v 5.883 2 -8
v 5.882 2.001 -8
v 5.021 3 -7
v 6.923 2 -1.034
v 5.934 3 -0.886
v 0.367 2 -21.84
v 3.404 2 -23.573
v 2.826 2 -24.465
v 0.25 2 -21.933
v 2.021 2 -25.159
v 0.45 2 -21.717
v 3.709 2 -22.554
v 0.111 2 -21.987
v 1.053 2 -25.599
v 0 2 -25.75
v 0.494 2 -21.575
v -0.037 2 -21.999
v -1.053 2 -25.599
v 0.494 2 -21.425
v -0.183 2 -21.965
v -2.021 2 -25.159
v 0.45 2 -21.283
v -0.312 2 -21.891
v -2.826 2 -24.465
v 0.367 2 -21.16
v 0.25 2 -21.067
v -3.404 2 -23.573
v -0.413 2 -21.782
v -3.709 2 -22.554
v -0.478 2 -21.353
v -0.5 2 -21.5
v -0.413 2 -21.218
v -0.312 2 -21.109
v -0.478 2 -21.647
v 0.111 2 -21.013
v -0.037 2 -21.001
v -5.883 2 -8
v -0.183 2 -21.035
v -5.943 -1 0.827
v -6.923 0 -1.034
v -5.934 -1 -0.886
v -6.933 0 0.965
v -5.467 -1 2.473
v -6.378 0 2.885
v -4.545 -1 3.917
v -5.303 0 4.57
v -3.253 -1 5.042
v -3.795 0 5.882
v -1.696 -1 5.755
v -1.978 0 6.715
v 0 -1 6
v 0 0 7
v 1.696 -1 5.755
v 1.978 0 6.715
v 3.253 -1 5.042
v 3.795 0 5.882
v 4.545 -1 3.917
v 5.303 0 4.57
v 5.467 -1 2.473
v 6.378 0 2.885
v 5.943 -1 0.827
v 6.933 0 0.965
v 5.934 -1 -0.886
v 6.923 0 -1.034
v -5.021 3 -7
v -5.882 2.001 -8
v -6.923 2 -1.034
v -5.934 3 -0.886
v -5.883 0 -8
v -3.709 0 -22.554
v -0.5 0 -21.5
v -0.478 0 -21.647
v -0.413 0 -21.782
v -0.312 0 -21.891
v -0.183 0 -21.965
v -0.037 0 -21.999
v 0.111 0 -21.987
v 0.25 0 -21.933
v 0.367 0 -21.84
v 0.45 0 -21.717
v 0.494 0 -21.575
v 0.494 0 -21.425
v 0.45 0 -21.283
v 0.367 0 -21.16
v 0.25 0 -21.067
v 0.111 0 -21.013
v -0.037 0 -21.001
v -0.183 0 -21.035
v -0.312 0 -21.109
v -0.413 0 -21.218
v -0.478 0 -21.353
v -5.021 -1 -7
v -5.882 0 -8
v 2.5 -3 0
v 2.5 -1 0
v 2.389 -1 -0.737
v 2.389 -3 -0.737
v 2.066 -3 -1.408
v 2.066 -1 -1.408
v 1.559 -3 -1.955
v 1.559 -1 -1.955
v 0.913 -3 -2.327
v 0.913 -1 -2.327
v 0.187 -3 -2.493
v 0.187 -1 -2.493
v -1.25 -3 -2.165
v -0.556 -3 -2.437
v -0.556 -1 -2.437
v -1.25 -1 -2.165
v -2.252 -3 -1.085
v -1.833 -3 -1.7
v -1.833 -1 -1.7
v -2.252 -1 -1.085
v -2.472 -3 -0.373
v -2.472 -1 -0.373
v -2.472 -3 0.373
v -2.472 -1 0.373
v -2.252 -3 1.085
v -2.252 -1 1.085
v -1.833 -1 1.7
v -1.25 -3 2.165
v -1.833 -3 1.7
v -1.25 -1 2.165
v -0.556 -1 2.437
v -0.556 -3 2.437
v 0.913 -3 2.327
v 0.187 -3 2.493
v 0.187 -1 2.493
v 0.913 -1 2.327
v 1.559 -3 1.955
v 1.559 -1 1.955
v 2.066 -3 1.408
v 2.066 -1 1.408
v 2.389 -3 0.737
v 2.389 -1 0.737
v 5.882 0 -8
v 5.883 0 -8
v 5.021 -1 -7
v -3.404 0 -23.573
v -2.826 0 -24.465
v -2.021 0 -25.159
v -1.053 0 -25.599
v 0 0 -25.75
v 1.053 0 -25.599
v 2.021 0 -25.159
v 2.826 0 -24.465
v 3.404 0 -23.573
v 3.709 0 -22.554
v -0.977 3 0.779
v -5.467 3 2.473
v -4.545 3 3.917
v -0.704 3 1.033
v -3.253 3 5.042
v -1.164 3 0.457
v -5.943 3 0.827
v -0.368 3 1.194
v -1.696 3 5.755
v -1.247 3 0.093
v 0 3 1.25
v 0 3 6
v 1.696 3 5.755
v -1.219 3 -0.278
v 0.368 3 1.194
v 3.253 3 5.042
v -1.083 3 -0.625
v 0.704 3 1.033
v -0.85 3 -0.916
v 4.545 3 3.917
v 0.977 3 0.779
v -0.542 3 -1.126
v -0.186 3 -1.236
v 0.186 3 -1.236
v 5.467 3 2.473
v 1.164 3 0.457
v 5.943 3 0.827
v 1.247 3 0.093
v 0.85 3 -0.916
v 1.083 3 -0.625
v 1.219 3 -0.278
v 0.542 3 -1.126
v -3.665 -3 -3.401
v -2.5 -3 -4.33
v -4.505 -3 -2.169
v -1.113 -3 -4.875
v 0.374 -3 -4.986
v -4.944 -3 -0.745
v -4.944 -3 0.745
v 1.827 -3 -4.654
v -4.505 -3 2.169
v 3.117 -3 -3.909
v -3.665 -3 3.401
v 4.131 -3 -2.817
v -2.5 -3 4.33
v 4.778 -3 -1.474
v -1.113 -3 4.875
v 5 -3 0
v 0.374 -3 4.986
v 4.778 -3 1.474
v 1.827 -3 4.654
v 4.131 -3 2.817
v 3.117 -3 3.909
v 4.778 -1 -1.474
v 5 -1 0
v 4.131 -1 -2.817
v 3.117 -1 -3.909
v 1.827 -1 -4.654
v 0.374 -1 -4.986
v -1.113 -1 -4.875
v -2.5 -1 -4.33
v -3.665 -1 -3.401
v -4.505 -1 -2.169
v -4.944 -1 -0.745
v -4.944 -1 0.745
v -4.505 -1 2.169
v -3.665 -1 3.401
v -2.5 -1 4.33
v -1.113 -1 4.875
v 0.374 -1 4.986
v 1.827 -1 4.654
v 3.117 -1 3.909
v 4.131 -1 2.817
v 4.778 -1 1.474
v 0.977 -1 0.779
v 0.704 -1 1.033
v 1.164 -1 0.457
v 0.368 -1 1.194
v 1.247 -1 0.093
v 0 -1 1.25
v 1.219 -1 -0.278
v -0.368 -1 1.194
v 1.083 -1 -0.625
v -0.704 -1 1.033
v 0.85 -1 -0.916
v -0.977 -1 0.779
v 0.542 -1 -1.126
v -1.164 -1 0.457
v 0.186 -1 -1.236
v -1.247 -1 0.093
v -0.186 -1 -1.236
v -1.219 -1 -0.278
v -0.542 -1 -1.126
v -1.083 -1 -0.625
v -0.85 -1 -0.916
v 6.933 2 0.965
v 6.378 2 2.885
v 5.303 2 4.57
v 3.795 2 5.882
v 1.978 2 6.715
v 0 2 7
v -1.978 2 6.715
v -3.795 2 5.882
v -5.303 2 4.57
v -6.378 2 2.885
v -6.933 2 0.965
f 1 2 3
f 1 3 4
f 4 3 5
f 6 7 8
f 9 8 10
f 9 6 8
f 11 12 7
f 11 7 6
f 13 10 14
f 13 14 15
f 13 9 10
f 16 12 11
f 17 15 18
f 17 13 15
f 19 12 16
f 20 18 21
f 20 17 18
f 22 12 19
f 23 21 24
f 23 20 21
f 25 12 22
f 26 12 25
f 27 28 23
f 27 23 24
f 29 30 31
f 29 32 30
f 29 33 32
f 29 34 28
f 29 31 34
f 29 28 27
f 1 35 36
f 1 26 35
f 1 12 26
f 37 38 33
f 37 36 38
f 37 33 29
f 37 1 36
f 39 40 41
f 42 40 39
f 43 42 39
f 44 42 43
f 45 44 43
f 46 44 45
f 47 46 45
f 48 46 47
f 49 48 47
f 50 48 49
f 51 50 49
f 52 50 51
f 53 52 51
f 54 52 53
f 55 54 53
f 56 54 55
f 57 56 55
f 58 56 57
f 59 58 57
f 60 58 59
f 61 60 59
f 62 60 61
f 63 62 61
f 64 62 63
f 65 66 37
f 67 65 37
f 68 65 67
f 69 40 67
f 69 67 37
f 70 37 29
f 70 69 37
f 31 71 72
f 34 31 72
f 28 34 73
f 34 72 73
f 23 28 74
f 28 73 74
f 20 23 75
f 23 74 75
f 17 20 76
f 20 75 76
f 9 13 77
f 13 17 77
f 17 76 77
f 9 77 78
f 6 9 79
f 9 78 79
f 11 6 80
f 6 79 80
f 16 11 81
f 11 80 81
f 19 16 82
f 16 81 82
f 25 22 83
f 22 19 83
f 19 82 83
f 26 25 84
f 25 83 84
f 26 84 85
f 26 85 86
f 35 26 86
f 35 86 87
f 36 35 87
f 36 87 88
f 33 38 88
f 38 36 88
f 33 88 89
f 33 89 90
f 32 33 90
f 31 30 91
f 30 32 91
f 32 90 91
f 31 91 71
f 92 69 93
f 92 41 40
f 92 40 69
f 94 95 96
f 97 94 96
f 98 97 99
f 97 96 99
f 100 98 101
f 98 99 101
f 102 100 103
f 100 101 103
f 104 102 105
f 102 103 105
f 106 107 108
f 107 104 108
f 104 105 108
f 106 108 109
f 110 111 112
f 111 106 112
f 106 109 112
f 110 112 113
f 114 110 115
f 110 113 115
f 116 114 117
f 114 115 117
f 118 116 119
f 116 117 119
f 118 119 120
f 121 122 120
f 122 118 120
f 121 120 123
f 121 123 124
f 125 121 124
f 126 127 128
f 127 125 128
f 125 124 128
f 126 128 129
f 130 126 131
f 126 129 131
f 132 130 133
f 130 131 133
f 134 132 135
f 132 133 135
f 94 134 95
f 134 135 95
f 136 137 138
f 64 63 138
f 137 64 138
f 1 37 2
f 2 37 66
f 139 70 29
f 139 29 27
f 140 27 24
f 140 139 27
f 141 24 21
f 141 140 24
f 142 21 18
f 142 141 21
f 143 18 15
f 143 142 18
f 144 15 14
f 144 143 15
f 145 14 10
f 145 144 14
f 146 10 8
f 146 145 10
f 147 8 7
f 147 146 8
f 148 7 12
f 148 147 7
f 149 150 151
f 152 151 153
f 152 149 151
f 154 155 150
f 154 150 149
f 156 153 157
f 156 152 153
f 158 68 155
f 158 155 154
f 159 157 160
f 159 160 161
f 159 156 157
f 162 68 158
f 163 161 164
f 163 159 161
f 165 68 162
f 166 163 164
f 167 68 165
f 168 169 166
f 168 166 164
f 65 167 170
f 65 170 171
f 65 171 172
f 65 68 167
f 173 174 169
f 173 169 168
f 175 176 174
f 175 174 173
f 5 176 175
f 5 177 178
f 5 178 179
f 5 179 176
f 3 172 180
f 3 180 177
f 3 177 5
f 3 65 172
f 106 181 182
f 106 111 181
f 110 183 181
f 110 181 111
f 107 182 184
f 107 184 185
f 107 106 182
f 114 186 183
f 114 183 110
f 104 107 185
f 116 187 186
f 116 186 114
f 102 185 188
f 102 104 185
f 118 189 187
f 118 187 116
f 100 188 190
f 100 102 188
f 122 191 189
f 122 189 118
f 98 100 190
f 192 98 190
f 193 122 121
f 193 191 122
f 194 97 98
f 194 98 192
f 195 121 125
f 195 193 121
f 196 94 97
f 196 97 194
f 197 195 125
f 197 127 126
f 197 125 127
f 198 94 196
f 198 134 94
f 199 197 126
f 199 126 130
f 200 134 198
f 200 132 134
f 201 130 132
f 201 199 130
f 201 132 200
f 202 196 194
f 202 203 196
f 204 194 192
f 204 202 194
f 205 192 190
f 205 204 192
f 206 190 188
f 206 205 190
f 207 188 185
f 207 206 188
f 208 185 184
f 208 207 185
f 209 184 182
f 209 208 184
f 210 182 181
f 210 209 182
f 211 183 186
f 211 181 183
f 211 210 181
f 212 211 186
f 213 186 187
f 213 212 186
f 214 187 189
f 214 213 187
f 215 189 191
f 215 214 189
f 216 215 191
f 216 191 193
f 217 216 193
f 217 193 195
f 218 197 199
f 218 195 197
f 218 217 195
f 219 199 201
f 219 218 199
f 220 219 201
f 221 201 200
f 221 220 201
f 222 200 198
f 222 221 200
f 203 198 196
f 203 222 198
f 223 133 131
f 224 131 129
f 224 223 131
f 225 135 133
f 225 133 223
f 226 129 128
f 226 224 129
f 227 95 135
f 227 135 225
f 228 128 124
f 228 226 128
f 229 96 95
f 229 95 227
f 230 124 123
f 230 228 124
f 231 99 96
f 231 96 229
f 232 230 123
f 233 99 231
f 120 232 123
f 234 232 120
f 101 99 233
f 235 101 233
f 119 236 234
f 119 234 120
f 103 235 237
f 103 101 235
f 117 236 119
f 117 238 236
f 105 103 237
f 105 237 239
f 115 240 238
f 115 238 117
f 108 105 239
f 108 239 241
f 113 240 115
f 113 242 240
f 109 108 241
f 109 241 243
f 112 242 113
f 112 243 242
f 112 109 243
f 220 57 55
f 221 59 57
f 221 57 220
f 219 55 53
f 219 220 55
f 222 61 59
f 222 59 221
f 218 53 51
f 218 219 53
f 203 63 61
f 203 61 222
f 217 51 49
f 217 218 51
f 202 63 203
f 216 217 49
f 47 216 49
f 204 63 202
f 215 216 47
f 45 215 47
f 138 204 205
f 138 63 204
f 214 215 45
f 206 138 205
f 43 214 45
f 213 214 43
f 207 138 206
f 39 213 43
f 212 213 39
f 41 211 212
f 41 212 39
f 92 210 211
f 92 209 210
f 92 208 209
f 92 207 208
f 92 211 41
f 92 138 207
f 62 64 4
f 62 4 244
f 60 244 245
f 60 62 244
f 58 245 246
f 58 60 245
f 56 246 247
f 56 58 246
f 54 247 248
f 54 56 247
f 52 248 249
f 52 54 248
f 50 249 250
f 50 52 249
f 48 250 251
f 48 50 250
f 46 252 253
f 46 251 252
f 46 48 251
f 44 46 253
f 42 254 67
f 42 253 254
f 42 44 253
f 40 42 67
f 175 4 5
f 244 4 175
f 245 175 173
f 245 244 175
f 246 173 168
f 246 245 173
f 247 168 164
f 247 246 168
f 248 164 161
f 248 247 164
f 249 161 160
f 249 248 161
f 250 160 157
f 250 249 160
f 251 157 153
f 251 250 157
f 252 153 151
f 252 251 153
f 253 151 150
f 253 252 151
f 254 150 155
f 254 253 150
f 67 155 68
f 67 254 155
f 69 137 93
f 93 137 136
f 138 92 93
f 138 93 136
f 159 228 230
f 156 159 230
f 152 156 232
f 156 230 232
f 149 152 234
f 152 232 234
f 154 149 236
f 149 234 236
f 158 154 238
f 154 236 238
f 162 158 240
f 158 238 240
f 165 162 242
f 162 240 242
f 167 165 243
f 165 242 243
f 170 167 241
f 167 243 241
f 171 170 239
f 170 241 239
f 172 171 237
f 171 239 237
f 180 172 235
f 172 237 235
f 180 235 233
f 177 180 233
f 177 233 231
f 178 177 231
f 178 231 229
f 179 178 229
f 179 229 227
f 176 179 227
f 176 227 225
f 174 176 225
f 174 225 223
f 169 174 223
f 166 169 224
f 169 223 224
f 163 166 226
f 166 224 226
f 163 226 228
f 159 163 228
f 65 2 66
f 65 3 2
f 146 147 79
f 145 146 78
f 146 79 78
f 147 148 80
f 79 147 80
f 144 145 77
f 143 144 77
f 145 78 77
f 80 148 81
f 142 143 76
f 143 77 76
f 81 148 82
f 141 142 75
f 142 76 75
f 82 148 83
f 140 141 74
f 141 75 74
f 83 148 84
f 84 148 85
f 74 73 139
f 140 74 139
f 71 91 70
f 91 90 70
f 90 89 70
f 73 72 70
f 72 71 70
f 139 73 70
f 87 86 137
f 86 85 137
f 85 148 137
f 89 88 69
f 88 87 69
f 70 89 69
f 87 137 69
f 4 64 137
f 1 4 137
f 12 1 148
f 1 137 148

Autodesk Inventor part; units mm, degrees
ref_plane "YZ Plane" through (0, 0, 0) normal (1, 0, 0) x (0, 1, 0)
ref_plane "XZ Plane" through (0, 0, 0) normal (0, 1, 0) x (-1, 0, 0)
sketch "Sketch1" plane through (0, 0, 0) normal (0, 1, 0) x (-1, 0, 0)
  arc A0 (6.9232, -1.0341) -> (-6.9232, -1.0341) centre (0, 0) ccw
  arc A1 (-3.7089, -22.554) -> (3.7089, -22.554) centre (0, -22) ccw
  line L0 (6.9232, -1.0341) -> (3.7089, -22.554)
  line L1 (-6.9232, -1.0341) -> (-3.7089, -22.554)
  circle A2 centre (0, -21.5) radius 0.5
  dimension "d0" = 14
  dimension "d1" = 7.5
  dimension "d2" = 22
  dimension "d3" = 1
  dimension "d4" = 21.5
extrude "Extrusion1" add sketch "Sketch1" along normal blind 2
sketch "Sketch2" plane through (0, 2, 0) normal (0, 1, 0) x (1, 0, 0)
  line L0 (-3.7089, 22.554) -> (-6.9232, 1.0341) projected
  line L1 (-5.8827, 8) -> (5.8827, 8)
  line L2 (6.9232, 1.0341) -> (3.7089, 22.554) projected
  arc A0 (-6.9232, 1.0341) -> (6.9232, 1.0341) centre (0, 0) ccw projected
  dimension "d7" = 8
extrude "Extrusion2" add sketch "Sketch2" along normal blind 1
chamfer "Chamfer1" distance 1 angle 45 3 edges at (6.403, 3, -4.517) (0, 3, 7) (-6.403, 3, -4.517)
chamfer "Chamfer2" distance 1 angle 45 1 edges at (0, 3, -8)
ref_plane "Work Plane1" through (0, 1, 0) normal (0, -1, 0) x (1, 0, 0)
mirror "Mirror1" about plane through (0, 1, 0) normal (0, -1, 0)
sketch "Sketch3" plane through (0, -1, 0) normal (0, -1, 0) x (1, 0, 0)
  circle A0 centre (0, 0) radius 5
  circle A1 centre (0, 0) radius 2.5
  dimension "d17" = 10
  dimension "d18" = 5
extrude "Extrusion3" add sketch "Sketch3" along normal blind 2
sketch "Sketch4" plane through (0, 3, 0) normal (0, 1, 0) x (1, 0, 0)
  point P0 (0, 0)
  point P1 (0, 0)
hole "Hole1" at (0, 3, 0) direction (0, -1, 0) diameter 2.5 depth 6
properties part number "5P.00.18.01-IB-VTP-Servo-Horn"
